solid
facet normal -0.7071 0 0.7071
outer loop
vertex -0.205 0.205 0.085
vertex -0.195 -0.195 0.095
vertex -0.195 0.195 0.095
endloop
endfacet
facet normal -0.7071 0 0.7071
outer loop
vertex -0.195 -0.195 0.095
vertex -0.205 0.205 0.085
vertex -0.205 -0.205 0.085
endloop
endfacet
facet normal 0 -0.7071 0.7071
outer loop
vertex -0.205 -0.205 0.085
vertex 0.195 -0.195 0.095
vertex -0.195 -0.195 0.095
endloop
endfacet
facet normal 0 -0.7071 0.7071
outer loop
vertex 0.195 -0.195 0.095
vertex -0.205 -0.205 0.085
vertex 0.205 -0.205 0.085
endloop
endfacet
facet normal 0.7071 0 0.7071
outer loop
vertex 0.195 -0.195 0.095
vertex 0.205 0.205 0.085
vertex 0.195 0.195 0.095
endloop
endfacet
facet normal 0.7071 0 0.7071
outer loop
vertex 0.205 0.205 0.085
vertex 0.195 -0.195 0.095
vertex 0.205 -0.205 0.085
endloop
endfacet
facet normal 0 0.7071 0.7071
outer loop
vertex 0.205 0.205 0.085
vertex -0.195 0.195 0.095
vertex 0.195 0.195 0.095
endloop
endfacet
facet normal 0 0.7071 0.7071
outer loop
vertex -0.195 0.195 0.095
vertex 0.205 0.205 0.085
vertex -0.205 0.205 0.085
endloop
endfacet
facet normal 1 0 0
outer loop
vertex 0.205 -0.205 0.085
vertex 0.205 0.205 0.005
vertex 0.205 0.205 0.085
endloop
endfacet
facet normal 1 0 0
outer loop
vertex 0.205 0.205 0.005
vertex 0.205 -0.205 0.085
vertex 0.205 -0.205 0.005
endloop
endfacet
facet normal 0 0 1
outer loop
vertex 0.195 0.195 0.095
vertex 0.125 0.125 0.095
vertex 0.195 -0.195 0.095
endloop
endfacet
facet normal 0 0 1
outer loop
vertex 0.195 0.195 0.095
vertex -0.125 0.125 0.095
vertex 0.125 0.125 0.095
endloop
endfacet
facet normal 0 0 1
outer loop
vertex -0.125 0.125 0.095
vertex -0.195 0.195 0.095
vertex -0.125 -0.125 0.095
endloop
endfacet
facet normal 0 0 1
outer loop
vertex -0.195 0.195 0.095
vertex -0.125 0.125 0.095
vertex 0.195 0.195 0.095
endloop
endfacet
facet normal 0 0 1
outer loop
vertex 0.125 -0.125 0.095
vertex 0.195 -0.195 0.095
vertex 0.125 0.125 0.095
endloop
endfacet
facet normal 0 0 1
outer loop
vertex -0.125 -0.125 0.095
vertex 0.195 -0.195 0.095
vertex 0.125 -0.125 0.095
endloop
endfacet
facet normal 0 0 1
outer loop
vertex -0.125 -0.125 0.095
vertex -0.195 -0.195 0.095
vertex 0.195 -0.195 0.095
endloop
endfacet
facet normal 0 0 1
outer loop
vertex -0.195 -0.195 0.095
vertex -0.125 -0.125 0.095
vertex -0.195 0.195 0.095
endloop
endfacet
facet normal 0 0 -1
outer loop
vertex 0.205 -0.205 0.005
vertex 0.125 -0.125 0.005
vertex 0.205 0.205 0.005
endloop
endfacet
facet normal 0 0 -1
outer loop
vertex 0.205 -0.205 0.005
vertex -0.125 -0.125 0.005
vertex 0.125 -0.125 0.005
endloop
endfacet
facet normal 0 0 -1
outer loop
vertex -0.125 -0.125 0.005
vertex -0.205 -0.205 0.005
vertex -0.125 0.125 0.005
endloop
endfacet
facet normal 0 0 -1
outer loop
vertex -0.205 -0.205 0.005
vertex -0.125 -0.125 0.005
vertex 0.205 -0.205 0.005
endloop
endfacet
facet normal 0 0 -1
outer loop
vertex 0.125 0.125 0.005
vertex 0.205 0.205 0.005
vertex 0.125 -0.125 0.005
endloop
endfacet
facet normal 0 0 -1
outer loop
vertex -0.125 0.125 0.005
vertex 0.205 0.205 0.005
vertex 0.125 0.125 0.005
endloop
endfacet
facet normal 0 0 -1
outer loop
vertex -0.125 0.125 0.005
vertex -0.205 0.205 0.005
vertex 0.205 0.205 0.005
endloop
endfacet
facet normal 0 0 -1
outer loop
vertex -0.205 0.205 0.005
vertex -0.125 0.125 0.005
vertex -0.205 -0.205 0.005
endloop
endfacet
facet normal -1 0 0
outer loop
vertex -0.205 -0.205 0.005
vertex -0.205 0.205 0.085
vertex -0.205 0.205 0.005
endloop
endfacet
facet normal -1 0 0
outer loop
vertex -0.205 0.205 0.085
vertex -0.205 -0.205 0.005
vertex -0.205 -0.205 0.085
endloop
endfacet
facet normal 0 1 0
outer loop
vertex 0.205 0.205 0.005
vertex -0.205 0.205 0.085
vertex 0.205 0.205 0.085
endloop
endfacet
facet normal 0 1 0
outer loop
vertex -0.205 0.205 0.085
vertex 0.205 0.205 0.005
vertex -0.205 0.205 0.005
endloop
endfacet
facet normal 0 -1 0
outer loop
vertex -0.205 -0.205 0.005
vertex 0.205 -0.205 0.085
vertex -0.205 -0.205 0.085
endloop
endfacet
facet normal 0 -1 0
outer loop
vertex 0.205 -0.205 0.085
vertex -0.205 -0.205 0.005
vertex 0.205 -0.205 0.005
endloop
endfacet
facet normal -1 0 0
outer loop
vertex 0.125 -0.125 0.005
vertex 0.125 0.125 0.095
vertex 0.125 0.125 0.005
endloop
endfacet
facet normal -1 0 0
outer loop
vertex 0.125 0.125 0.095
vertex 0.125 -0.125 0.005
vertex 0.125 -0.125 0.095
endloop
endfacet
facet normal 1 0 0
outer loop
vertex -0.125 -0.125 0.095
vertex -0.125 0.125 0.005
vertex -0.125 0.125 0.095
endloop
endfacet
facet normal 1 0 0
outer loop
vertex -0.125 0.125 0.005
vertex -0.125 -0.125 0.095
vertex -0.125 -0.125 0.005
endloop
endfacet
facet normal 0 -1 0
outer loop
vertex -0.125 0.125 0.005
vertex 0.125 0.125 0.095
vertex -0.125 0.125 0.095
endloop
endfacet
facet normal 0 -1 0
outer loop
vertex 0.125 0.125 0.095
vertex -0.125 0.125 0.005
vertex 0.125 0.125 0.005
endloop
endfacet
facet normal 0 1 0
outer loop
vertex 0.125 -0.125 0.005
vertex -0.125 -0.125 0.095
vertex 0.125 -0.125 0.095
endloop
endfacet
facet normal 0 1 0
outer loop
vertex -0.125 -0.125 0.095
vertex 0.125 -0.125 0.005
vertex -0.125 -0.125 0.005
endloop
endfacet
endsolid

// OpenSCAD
// file: PowerSymbol.scad
symWidth = 0.038;
symHeight = 0.086;
symDepth = 0.01;
middleHeight = 0.0075;
topHorizOffset = 0.007;
sideVertOffset = 0.007;

module PowerSymbol() {
  linear_extrude(symDepth, center=true) {
    halfHei = symHeight/2;
    halfWid = symWidth/2;
    halfMid = middleHeight/2;
    polygon([
      [topHorizOffset, halfHei],
      [0, halfMid],
      [halfWid, sideVertOffset],
      [-topHorizOffset, -halfHei],
      [0, -halfMid],
      [-halfWid, -sideVertOffset]
    ]);
  }
}

PowerSymbol();
// file: BasicFPGAHousing_base.scad
include <BasicFPGAHousing_shared.scad>;
use <BasicFPGAHousing_paintcap.scad>;
use <PowerSymbol.scad>;

module BasicFPGAHousing_base() {
  middleSize = (slotSize + capSize) / 2;
  difference() {
    union() {
      translate([0,0,baseCenter])
        cube(size=[baseSize, baseSize, baseDepth], center=true);
      translate([0,0,baseTop-eps])
        cube(size=[middleSize, middleSize, capDepth*2], center=true);
    }
    translate([0,0,baseBottom])
      cube(size=[baseBackCutoutSize, baseBackCutoutSize, baseBackCutoutDepth*2], center=true);
    BasiFPGAHousing_chipcutout();
    cablecutout();
    rotate([0,0,180]) cablecutout();
  }
}

BasicFPGAHousing_base();
%BasicFPGAHousing_paintcap();
%translate([0.05,smallGridSize/2,0]) rotate([-90, 0, 0]) PowerSymbol();
// file: BasicFPGAHousing_shared.scad
smallGridSize = 0.5;
baseSize = smallGridSize;
baseTop = 0.05;
baseBottom = -0.045;
baseDepth = baseTop - baseBottom;
baseCenter = (baseTop + baseBottom)/2;
baseBackRim = 0.02;
baseBackCutoutSize = baseSize - baseBackRim*2;
baseBackCutoutDepth = 0.01;
capSize = 0.41;
capDepth = 0.045;
capBevel = 0.01;
slotSize = smallGridSize * 0.5;
slotBottom = 0.03;
slotPinEdgeCount = 4;
slotPinEdgePad = 0.01;
slotPinEdgeSpacing = 0.045;
slotPinSize = 0.025;
slotPinDepth = 0.025;
eps = 0.00001;

module BasiFPGAHousing_chipcutout() {
  slotPinBaseOffset = (-slotPinEdgeCount-1)/2 * slotPinEdgeSpacing;
  slotPinEdgeOffset = slotSize/2 - slotPinSize/2 - slotPinEdgePad;
  union() {
    translate([0, 0, baseDepth/2 + slotBottom + slotPinDepth]) {
      cube(size=[slotSize, slotSize, baseDepth], center=true);
    }
    for(edge=[1:4]) rotate([0,0,90*edge]) {
      for(i=[1:slotPinEdgeCount]) {
        translate([
          slotPinBaseOffset + slotPinEdgeSpacing*i,
          slotPinEdgeOffset,
          slotBottom + slotPinDepth
        ]) {
          cube(size=[slotPinSize, slotPinSize, slotPinDepth*2], center=true);
        }
      }
    }
  }
}

module cablecutout() {
  cableradius = 0.025;
  cableDepth = 0.0125;
  translate([0,smallGridSize/2,0]) rotate([90,0,0]) {
    cylinder(h=cableDepth*2, r=cableradius, center=true, $fn=8);
  }
}
// main file
include <BasicFPGAHousing_shared.scad>;
use <BasicFPGAHousing_base.scad>;

module BasicFPGAHousing_paintcap() {
  bevelDepth = capBevel * sqrt(2);
  difference() {
    translate([0,0,baseTop]) {
      cube(size=[capSize, capSize, capDepth*2], center=true);
    }
    cube(size=[slotSize+eps, slotSize+eps, smallGridSize], center=true);
    for (edge=[1:4]) rotate([0,0,90*edge]) {
      translate([0,capSize/2,baseTop+capDepth]) rotate([45,0,0])
        cube(size=[capSize+0.1, bevelDepth, bevelDepth*2], center=true);
    }
  }
}

%BasicFPGAHousing_base();
BasicFPGAHousing_paintcap();
